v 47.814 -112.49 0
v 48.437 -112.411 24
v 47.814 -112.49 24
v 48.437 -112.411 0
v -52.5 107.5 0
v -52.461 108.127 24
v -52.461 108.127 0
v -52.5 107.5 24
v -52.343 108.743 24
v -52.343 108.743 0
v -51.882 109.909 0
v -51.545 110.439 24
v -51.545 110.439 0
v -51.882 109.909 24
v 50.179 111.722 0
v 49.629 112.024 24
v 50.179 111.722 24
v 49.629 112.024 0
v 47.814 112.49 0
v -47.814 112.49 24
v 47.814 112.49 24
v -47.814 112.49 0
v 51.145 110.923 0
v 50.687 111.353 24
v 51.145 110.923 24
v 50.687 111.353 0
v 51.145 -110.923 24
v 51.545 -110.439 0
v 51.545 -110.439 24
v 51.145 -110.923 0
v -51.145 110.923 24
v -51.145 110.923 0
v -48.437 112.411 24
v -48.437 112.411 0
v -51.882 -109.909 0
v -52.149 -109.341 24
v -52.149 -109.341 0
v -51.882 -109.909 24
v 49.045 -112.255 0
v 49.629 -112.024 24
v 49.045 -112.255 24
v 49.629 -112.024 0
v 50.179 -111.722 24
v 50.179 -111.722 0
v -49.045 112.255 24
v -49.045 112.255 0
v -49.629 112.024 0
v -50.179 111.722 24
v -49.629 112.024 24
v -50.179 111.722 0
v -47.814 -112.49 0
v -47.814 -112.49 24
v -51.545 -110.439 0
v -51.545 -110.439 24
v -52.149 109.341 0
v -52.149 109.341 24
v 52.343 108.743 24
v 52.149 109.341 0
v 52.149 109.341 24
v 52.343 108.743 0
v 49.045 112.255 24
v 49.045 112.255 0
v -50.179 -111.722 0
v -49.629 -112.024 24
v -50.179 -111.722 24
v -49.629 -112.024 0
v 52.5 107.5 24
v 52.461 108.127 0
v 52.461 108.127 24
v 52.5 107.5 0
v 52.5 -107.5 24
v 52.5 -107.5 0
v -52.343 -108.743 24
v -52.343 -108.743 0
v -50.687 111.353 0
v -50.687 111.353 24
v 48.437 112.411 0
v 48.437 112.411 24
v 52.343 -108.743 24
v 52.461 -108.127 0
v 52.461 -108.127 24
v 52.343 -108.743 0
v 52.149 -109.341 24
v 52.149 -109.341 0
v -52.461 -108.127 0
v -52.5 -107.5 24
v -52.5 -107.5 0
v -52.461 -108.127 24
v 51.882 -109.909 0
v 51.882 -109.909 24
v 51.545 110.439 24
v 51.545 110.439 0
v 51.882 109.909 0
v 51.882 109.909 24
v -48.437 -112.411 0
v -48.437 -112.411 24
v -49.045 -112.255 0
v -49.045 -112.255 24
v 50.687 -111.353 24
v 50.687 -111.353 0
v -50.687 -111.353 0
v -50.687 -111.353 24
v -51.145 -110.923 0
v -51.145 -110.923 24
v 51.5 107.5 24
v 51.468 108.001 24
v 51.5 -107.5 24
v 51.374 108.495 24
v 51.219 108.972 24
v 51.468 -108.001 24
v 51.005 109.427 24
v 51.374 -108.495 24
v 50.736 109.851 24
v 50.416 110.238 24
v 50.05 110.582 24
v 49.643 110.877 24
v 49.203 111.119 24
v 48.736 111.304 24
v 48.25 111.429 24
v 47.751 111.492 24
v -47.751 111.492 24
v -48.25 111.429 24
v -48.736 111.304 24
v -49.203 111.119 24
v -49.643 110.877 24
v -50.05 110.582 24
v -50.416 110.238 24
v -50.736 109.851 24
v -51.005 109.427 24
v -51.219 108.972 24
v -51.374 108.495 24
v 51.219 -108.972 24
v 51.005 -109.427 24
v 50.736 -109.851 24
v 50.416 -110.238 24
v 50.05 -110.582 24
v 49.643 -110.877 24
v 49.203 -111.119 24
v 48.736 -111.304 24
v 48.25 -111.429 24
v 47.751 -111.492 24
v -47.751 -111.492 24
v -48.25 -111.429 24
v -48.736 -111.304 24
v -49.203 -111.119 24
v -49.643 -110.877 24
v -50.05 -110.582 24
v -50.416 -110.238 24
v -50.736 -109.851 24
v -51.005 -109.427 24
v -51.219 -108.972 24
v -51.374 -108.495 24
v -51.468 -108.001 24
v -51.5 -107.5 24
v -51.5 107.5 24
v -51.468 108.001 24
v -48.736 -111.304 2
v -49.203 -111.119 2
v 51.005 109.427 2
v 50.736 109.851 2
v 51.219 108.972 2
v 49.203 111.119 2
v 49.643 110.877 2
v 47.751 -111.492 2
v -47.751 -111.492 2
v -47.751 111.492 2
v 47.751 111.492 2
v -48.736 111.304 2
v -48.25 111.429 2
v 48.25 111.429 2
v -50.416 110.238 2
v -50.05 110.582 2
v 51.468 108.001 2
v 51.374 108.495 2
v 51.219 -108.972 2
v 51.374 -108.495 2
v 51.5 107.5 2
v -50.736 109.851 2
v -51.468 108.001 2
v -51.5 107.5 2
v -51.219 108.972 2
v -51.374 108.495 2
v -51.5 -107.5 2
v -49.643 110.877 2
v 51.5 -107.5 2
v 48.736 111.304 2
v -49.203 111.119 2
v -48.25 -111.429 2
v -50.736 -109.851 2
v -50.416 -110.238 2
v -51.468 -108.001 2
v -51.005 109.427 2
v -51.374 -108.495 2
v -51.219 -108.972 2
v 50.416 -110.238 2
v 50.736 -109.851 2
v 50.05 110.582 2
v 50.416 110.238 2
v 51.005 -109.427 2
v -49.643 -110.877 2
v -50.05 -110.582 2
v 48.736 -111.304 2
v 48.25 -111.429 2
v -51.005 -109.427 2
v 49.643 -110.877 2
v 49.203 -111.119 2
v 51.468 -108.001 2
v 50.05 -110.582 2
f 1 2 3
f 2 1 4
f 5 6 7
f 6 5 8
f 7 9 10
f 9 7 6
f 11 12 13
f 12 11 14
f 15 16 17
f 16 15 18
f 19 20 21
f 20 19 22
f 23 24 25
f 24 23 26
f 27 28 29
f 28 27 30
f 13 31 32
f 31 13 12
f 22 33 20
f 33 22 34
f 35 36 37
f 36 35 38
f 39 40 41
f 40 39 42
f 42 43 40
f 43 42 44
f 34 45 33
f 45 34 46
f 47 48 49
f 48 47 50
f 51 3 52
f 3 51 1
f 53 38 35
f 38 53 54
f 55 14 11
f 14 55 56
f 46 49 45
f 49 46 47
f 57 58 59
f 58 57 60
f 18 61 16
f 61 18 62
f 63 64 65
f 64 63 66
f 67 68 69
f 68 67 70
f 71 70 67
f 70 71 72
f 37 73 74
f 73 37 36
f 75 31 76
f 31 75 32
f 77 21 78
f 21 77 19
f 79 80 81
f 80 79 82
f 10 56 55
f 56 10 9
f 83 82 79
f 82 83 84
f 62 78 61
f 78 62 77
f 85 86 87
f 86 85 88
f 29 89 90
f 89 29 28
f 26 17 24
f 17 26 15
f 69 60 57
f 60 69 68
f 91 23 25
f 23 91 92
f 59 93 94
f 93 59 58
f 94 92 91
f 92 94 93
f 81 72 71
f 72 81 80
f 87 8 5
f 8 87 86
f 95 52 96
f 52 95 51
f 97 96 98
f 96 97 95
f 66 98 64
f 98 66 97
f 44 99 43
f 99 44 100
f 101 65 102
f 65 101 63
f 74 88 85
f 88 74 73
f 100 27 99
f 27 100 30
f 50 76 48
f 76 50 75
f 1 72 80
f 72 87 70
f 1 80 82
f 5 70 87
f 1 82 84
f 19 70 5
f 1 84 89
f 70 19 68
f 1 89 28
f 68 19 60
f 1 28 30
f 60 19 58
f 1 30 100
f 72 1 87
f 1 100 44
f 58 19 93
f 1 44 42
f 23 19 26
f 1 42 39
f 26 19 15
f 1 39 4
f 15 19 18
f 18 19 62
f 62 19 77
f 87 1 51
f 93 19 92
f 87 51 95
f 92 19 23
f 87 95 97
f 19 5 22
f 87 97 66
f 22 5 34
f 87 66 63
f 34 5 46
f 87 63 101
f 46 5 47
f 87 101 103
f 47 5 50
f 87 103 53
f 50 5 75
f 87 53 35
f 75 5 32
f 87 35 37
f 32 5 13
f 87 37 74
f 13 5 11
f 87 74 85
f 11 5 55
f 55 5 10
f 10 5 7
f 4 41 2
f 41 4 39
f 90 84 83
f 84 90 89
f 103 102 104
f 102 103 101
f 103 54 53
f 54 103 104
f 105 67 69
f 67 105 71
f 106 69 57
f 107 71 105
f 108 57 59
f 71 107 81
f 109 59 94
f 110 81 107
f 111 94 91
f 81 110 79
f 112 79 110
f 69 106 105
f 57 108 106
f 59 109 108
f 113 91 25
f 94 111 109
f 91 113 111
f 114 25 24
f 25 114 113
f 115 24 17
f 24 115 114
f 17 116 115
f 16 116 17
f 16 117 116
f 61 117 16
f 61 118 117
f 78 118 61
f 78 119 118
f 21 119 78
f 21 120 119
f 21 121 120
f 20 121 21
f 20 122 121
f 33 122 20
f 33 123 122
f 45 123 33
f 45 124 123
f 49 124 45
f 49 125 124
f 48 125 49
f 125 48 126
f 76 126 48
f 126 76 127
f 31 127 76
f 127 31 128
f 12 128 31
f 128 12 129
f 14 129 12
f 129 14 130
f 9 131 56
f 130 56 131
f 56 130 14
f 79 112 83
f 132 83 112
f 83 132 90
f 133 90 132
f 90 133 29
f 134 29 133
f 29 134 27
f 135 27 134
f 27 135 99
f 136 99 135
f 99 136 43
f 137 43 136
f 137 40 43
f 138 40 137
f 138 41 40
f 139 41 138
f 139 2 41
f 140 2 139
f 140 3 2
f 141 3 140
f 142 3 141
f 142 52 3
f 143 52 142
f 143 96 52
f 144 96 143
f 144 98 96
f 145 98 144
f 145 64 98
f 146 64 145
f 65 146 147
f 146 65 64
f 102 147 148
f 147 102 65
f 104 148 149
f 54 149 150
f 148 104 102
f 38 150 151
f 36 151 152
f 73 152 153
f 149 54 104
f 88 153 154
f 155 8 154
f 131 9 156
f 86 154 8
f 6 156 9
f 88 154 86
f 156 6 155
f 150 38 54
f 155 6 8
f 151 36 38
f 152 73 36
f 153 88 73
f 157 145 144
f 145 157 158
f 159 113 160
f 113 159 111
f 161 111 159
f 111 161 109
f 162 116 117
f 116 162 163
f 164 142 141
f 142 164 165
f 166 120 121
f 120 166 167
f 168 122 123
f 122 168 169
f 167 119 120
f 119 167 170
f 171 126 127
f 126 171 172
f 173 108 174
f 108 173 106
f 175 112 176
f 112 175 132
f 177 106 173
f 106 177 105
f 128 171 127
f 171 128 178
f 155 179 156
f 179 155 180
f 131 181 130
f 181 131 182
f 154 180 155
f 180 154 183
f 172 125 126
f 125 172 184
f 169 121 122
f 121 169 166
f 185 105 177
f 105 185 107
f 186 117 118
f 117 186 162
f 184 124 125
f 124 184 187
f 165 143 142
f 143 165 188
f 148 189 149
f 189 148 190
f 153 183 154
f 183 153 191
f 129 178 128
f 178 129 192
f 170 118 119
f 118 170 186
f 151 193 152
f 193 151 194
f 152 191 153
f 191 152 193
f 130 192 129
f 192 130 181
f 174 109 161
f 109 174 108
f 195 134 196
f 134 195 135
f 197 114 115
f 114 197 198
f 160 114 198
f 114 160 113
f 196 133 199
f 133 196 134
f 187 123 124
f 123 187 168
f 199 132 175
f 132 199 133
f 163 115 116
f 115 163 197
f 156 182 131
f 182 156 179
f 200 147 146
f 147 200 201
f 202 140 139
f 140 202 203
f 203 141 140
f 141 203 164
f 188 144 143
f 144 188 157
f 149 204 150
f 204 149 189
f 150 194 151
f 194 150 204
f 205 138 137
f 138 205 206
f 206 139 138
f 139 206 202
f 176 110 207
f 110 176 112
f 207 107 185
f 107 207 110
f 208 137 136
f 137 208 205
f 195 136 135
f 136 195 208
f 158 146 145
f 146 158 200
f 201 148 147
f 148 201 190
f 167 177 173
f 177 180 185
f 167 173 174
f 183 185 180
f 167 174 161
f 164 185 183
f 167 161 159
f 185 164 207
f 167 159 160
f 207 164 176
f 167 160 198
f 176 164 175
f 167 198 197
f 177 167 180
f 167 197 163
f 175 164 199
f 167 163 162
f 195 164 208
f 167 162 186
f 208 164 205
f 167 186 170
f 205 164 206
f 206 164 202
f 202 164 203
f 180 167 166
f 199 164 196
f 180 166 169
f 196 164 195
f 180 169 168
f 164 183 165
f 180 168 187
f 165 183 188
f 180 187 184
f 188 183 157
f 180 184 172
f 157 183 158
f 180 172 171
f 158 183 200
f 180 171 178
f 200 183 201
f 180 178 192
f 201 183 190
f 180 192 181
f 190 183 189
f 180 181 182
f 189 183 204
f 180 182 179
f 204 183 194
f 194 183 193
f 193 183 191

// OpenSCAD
$fn = 50;


difference() {
	union() {
		hull() {
			translate(v = [-47.5000000000, 107.5000000000, 0]) {
				cylinder(h = 24, r = 5);
			}
			translate(v = [47.5000000000, 107.5000000000, 0]) {
				cylinder(h = 24, r = 5);
			}
			translate(v = [-47.5000000000, -107.5000000000, 0]) {
				cylinder(h = 24, r = 5);
			}
			translate(v = [47.5000000000, -107.5000000000, 0]) {
				cylinder(h = 24, r = 5);
			}
		}
	}
	union() {
		translate(v = [0, 0, 2]) {
			hull() {
				translate(v = [-47.5000000000, 107.5000000000, 0]) {
					cylinder(h = 22, r = 4);
				}
				translate(v = [47.5000000000, 107.5000000000, 0]) {
					cylinder(h = 22, r = 4);
				}
				translate(v = [-47.5000000000, -107.5000000000, 0]) {
					cylinder(h = 22, r = 4);
				}
				translate(v = [47.5000000000, -107.5000000000, 0]) {
					cylinder(h = 22, r = 4);
				}
			}
		}
	}
}
